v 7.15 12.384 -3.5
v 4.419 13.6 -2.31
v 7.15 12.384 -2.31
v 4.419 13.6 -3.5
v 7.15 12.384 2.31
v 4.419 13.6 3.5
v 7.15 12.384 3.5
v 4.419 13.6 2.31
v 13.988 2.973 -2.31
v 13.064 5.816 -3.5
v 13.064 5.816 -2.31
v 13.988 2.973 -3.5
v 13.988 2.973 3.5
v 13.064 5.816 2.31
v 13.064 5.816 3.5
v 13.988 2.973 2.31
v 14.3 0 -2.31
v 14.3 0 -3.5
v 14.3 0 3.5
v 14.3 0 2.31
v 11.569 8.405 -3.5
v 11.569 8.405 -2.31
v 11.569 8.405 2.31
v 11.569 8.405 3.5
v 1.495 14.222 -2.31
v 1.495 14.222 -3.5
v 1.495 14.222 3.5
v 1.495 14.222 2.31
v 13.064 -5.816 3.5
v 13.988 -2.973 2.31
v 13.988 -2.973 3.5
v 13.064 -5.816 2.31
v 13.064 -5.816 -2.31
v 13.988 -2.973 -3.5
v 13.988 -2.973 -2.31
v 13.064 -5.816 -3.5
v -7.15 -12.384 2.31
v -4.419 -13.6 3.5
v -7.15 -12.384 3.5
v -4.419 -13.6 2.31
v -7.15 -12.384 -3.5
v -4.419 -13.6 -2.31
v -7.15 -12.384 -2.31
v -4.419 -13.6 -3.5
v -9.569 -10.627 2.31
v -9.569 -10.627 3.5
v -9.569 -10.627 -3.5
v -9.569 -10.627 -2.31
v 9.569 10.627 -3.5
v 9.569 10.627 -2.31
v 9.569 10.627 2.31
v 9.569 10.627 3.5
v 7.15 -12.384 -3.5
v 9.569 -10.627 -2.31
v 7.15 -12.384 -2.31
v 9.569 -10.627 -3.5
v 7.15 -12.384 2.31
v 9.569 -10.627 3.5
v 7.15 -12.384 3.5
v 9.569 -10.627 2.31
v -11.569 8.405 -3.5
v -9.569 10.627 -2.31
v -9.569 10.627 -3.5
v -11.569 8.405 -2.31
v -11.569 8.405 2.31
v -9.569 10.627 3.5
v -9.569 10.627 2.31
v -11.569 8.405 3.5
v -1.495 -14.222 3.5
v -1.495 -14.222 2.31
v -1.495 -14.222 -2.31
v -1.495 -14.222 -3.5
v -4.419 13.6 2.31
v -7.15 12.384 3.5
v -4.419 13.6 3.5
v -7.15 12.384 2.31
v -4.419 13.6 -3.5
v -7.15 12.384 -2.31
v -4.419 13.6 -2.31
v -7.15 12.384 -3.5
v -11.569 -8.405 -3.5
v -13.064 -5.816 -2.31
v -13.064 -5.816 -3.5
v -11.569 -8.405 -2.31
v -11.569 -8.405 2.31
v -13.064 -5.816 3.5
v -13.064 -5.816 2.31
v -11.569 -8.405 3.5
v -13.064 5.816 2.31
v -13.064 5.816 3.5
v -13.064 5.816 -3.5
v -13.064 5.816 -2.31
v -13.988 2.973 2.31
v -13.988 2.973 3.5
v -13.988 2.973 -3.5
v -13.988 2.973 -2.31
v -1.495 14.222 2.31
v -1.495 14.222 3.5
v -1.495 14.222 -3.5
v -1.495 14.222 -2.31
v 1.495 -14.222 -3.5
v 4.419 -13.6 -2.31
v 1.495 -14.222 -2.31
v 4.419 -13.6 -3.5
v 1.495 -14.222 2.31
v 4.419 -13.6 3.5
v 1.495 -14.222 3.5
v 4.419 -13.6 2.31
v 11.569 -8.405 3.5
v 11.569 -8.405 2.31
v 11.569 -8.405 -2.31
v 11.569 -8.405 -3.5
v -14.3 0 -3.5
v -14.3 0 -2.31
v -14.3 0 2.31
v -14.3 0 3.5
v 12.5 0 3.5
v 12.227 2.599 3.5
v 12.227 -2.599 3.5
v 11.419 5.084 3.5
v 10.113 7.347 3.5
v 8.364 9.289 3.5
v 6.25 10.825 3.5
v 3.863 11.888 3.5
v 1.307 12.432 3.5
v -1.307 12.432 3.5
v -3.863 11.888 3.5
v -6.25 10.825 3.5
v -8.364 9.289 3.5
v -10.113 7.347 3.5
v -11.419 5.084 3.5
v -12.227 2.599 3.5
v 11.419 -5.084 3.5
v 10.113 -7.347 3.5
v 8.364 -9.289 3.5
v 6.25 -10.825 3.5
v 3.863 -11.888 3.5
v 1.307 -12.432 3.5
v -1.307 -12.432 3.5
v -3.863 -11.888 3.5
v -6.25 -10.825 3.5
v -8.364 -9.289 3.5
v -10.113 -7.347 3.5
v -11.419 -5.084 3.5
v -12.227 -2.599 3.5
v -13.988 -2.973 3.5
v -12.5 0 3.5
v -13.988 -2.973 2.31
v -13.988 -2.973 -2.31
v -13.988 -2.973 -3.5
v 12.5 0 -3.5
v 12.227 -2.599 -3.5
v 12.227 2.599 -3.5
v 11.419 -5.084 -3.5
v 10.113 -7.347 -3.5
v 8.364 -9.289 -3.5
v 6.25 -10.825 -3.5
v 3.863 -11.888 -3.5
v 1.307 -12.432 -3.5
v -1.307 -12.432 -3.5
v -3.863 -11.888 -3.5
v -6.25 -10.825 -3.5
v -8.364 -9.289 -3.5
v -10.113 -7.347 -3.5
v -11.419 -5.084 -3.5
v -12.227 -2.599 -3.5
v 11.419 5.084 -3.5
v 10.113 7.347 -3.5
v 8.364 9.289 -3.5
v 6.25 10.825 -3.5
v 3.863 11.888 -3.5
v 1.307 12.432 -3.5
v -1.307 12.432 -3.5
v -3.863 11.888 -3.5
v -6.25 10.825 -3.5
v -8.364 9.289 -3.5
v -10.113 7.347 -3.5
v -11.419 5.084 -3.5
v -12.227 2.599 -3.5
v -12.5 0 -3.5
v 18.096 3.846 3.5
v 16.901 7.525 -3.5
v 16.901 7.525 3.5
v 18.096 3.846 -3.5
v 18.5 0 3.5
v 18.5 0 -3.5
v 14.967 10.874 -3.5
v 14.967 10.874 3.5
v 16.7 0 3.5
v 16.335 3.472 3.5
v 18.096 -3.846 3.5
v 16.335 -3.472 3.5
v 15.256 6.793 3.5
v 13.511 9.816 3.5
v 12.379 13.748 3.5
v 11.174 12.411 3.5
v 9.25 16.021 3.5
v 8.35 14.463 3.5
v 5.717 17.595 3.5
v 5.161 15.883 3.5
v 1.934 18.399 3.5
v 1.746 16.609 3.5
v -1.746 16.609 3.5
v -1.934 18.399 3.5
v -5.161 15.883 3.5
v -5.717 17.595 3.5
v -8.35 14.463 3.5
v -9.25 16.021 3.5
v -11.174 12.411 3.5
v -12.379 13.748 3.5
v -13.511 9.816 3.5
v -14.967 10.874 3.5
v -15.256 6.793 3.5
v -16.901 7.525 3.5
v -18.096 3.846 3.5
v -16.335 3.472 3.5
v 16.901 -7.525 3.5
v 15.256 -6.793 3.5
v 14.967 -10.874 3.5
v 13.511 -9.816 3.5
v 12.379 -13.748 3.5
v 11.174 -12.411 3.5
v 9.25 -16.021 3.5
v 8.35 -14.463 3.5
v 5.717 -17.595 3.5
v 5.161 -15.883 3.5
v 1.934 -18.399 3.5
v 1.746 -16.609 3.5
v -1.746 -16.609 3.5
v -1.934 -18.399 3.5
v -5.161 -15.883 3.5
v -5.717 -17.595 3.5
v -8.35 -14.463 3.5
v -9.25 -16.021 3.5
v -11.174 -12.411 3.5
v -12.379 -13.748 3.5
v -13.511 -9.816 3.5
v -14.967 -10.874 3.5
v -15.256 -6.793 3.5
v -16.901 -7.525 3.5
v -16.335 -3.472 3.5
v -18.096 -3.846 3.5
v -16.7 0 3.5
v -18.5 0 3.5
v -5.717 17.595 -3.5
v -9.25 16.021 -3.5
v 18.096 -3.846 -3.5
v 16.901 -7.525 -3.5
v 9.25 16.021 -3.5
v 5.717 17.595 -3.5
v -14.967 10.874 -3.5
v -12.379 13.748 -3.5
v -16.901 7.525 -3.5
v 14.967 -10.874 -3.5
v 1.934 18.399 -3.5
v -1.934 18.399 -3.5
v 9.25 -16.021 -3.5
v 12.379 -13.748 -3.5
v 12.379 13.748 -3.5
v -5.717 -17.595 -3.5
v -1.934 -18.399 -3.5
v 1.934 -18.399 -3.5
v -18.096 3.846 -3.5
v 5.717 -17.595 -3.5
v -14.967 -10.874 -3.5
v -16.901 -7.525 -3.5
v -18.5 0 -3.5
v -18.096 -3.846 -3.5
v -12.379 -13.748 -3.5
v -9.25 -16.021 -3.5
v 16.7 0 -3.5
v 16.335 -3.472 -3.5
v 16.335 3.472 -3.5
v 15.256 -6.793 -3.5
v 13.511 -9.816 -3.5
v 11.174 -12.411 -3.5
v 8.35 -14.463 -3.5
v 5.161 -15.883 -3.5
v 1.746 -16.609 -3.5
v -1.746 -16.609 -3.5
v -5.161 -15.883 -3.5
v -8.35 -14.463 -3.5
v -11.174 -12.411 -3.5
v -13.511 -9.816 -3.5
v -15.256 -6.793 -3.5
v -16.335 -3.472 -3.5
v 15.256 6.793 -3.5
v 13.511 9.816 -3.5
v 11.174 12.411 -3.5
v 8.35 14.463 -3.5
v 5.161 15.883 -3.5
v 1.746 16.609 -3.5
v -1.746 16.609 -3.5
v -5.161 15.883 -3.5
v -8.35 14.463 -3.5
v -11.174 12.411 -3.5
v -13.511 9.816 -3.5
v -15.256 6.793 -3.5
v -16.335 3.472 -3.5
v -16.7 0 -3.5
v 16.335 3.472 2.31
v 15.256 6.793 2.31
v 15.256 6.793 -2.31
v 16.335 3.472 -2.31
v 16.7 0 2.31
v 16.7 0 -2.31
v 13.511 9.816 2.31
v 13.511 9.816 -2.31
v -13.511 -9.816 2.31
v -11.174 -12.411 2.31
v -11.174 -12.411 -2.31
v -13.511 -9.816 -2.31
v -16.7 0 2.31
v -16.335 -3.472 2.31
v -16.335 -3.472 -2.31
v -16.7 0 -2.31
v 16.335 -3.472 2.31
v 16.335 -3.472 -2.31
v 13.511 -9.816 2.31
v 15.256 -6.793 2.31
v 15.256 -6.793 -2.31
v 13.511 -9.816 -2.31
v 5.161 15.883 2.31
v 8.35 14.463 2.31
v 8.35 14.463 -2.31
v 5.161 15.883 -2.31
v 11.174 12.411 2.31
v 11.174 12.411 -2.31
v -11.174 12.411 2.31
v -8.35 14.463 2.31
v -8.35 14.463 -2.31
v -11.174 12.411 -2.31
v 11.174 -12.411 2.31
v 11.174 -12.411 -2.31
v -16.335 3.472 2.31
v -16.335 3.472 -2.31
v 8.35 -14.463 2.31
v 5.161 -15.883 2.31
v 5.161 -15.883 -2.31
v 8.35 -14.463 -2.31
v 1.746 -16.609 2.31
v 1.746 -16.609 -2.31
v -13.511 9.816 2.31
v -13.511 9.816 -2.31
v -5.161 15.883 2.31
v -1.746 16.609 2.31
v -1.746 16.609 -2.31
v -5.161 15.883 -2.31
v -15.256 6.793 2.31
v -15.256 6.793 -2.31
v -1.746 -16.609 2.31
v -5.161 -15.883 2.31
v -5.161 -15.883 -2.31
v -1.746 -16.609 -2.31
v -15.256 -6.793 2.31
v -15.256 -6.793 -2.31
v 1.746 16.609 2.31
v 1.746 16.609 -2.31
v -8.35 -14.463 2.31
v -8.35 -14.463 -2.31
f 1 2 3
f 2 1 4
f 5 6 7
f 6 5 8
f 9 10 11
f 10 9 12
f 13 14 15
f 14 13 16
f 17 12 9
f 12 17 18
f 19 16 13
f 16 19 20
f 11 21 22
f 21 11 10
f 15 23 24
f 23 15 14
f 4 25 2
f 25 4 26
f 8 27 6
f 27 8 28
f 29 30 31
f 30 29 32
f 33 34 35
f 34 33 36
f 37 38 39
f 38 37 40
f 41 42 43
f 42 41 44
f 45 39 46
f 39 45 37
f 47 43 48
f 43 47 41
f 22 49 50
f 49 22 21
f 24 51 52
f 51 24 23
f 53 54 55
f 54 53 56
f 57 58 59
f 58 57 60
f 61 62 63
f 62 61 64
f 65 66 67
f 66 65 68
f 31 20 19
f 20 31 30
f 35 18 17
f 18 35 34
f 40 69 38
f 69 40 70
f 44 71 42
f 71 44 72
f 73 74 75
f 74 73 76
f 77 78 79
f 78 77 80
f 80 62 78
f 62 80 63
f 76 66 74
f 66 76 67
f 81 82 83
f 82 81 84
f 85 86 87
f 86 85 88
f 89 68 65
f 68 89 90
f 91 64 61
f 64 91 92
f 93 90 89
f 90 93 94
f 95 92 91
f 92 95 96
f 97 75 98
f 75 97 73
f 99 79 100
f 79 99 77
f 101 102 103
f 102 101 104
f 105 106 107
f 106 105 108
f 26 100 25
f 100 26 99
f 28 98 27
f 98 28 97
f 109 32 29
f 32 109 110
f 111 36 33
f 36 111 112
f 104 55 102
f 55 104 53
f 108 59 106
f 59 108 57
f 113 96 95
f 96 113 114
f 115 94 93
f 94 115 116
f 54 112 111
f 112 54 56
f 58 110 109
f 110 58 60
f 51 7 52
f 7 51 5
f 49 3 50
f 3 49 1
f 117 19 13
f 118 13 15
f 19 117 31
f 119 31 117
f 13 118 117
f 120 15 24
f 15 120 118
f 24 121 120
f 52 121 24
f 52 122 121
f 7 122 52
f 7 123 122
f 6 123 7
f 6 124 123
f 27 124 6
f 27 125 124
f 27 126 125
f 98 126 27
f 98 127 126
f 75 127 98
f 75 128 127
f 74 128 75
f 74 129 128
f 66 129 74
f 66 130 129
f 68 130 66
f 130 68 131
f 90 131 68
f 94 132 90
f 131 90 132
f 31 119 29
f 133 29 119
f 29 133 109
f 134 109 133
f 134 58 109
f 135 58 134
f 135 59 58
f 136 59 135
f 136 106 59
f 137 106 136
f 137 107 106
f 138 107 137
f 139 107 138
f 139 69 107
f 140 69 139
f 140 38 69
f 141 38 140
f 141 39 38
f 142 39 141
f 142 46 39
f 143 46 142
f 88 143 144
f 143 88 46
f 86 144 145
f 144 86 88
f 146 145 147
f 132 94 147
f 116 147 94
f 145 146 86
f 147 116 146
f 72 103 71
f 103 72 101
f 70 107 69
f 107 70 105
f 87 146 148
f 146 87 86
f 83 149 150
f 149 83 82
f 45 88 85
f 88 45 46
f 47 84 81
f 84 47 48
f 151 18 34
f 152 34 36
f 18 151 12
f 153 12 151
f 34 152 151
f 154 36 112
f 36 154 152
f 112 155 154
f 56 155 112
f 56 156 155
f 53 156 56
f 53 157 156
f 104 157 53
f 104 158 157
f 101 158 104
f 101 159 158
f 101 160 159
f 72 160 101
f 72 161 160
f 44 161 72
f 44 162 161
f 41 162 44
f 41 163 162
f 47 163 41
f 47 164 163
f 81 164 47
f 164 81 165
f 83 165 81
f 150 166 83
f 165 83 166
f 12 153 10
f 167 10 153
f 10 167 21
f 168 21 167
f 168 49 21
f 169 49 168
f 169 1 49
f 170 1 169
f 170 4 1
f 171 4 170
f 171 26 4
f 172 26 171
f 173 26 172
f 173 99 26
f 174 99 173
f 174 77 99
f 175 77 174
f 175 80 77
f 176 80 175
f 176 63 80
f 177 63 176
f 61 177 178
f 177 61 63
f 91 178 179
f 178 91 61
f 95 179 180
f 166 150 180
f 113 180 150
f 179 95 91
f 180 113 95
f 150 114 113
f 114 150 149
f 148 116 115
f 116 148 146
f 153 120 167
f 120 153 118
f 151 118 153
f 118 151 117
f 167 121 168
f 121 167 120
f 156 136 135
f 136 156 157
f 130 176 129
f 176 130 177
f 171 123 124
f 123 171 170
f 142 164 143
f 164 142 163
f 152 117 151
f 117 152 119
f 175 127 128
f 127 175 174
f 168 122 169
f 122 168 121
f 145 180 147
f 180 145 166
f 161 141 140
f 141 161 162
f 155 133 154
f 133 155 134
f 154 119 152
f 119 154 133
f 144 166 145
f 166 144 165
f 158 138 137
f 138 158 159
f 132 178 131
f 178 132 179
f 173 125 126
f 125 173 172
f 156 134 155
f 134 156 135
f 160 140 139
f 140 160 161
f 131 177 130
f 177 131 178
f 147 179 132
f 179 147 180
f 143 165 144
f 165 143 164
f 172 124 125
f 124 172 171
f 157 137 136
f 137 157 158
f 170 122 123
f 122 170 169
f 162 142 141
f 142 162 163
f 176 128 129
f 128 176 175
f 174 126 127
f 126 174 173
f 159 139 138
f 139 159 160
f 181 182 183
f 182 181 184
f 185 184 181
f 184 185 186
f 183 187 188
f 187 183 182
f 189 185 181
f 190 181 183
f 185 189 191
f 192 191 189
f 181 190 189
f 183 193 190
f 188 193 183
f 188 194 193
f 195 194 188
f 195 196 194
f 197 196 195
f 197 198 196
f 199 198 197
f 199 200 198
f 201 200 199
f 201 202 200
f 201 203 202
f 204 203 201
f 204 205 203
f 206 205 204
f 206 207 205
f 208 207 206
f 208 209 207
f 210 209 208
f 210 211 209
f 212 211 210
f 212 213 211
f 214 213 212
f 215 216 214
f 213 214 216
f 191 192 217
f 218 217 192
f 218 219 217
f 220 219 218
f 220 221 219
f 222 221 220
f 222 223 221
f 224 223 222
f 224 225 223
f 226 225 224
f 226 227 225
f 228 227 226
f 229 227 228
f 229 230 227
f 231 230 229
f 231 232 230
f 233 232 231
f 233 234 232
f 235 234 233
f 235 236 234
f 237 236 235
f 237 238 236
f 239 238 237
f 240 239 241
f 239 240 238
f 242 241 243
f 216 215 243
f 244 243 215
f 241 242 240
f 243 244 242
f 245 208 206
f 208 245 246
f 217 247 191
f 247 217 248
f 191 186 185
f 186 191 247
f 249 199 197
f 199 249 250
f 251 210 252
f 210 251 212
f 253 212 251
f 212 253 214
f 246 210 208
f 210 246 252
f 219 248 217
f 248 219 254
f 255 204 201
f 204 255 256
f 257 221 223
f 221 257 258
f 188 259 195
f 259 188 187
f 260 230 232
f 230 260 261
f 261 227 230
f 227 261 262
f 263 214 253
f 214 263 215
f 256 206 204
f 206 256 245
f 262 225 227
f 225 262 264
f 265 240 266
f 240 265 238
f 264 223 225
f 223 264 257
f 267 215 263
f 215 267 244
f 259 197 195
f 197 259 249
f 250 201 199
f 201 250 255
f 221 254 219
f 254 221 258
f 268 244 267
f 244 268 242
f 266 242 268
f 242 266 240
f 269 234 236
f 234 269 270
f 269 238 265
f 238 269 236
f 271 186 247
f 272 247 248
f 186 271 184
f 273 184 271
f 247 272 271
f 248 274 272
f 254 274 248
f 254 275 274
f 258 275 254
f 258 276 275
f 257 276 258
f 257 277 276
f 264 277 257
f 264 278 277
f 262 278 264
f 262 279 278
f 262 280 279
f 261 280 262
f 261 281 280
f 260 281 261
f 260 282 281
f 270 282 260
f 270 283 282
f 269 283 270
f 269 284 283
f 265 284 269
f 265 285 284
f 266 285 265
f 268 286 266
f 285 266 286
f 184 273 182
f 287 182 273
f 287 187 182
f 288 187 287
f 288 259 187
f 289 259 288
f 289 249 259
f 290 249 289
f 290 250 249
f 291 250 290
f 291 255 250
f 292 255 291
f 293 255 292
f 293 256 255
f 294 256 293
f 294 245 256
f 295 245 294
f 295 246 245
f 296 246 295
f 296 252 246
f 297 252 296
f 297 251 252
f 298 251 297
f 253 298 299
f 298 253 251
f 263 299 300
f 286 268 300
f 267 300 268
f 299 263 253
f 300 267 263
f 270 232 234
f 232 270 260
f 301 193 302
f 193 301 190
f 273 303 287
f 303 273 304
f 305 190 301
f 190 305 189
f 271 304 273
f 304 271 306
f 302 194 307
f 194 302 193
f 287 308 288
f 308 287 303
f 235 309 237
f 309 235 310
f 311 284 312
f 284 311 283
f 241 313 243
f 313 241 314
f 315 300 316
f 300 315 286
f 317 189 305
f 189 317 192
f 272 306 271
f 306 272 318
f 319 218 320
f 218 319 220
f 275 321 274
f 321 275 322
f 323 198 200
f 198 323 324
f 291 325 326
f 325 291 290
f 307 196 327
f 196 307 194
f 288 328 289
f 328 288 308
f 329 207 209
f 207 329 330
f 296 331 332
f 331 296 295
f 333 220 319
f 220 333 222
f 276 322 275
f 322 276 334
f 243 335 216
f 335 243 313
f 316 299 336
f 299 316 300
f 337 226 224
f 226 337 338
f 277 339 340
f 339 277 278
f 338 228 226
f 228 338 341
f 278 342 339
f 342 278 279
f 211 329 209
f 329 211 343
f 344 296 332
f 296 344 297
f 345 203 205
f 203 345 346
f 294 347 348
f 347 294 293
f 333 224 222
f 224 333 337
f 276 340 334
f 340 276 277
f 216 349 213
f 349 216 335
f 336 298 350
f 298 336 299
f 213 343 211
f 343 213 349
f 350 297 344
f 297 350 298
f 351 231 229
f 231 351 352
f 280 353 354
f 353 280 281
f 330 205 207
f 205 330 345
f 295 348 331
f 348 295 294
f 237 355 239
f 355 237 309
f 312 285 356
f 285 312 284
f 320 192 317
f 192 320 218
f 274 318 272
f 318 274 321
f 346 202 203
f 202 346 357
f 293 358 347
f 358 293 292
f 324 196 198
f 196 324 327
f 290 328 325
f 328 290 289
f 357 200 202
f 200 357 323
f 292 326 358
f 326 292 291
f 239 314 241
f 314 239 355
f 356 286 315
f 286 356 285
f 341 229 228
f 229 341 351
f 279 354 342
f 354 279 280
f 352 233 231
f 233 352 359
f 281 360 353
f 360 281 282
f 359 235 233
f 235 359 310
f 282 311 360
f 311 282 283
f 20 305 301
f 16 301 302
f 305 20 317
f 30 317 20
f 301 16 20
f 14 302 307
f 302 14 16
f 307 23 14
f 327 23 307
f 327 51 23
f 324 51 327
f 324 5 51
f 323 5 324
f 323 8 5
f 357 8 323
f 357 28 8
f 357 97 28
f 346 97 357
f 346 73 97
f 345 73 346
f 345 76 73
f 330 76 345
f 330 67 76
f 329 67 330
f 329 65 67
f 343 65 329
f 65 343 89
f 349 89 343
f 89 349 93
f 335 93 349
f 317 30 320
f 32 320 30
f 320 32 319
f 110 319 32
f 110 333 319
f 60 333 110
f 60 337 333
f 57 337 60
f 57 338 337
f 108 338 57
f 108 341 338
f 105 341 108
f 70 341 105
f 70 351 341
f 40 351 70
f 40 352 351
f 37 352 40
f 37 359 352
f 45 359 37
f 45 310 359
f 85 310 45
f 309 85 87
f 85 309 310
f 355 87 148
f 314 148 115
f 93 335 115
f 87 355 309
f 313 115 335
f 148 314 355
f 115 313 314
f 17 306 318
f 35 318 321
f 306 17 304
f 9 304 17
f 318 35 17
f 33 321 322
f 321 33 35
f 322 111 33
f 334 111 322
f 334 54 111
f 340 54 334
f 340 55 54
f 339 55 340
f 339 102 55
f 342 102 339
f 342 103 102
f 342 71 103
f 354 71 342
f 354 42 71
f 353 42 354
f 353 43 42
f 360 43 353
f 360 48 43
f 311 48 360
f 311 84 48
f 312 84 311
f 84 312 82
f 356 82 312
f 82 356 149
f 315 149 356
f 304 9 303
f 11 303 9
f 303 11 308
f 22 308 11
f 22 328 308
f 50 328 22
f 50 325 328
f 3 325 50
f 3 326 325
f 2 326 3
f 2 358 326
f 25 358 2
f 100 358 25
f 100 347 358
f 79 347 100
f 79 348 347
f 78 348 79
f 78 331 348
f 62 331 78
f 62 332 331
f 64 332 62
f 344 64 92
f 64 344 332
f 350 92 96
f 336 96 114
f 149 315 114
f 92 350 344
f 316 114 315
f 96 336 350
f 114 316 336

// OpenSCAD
use <common.scad>

// [bore, OD, width] (mm) — 부품이 베어링 치수 필요할 때 가져다 쓰는 노출 값.
function bearing_6805zz_spec() = [25, 37, 7];

module bearing_6805zz(col = [0.62, 0.62, 0.63]) {
    bearing(bearing_6805zz_spec(), col);
}

bearing_6805zz();
